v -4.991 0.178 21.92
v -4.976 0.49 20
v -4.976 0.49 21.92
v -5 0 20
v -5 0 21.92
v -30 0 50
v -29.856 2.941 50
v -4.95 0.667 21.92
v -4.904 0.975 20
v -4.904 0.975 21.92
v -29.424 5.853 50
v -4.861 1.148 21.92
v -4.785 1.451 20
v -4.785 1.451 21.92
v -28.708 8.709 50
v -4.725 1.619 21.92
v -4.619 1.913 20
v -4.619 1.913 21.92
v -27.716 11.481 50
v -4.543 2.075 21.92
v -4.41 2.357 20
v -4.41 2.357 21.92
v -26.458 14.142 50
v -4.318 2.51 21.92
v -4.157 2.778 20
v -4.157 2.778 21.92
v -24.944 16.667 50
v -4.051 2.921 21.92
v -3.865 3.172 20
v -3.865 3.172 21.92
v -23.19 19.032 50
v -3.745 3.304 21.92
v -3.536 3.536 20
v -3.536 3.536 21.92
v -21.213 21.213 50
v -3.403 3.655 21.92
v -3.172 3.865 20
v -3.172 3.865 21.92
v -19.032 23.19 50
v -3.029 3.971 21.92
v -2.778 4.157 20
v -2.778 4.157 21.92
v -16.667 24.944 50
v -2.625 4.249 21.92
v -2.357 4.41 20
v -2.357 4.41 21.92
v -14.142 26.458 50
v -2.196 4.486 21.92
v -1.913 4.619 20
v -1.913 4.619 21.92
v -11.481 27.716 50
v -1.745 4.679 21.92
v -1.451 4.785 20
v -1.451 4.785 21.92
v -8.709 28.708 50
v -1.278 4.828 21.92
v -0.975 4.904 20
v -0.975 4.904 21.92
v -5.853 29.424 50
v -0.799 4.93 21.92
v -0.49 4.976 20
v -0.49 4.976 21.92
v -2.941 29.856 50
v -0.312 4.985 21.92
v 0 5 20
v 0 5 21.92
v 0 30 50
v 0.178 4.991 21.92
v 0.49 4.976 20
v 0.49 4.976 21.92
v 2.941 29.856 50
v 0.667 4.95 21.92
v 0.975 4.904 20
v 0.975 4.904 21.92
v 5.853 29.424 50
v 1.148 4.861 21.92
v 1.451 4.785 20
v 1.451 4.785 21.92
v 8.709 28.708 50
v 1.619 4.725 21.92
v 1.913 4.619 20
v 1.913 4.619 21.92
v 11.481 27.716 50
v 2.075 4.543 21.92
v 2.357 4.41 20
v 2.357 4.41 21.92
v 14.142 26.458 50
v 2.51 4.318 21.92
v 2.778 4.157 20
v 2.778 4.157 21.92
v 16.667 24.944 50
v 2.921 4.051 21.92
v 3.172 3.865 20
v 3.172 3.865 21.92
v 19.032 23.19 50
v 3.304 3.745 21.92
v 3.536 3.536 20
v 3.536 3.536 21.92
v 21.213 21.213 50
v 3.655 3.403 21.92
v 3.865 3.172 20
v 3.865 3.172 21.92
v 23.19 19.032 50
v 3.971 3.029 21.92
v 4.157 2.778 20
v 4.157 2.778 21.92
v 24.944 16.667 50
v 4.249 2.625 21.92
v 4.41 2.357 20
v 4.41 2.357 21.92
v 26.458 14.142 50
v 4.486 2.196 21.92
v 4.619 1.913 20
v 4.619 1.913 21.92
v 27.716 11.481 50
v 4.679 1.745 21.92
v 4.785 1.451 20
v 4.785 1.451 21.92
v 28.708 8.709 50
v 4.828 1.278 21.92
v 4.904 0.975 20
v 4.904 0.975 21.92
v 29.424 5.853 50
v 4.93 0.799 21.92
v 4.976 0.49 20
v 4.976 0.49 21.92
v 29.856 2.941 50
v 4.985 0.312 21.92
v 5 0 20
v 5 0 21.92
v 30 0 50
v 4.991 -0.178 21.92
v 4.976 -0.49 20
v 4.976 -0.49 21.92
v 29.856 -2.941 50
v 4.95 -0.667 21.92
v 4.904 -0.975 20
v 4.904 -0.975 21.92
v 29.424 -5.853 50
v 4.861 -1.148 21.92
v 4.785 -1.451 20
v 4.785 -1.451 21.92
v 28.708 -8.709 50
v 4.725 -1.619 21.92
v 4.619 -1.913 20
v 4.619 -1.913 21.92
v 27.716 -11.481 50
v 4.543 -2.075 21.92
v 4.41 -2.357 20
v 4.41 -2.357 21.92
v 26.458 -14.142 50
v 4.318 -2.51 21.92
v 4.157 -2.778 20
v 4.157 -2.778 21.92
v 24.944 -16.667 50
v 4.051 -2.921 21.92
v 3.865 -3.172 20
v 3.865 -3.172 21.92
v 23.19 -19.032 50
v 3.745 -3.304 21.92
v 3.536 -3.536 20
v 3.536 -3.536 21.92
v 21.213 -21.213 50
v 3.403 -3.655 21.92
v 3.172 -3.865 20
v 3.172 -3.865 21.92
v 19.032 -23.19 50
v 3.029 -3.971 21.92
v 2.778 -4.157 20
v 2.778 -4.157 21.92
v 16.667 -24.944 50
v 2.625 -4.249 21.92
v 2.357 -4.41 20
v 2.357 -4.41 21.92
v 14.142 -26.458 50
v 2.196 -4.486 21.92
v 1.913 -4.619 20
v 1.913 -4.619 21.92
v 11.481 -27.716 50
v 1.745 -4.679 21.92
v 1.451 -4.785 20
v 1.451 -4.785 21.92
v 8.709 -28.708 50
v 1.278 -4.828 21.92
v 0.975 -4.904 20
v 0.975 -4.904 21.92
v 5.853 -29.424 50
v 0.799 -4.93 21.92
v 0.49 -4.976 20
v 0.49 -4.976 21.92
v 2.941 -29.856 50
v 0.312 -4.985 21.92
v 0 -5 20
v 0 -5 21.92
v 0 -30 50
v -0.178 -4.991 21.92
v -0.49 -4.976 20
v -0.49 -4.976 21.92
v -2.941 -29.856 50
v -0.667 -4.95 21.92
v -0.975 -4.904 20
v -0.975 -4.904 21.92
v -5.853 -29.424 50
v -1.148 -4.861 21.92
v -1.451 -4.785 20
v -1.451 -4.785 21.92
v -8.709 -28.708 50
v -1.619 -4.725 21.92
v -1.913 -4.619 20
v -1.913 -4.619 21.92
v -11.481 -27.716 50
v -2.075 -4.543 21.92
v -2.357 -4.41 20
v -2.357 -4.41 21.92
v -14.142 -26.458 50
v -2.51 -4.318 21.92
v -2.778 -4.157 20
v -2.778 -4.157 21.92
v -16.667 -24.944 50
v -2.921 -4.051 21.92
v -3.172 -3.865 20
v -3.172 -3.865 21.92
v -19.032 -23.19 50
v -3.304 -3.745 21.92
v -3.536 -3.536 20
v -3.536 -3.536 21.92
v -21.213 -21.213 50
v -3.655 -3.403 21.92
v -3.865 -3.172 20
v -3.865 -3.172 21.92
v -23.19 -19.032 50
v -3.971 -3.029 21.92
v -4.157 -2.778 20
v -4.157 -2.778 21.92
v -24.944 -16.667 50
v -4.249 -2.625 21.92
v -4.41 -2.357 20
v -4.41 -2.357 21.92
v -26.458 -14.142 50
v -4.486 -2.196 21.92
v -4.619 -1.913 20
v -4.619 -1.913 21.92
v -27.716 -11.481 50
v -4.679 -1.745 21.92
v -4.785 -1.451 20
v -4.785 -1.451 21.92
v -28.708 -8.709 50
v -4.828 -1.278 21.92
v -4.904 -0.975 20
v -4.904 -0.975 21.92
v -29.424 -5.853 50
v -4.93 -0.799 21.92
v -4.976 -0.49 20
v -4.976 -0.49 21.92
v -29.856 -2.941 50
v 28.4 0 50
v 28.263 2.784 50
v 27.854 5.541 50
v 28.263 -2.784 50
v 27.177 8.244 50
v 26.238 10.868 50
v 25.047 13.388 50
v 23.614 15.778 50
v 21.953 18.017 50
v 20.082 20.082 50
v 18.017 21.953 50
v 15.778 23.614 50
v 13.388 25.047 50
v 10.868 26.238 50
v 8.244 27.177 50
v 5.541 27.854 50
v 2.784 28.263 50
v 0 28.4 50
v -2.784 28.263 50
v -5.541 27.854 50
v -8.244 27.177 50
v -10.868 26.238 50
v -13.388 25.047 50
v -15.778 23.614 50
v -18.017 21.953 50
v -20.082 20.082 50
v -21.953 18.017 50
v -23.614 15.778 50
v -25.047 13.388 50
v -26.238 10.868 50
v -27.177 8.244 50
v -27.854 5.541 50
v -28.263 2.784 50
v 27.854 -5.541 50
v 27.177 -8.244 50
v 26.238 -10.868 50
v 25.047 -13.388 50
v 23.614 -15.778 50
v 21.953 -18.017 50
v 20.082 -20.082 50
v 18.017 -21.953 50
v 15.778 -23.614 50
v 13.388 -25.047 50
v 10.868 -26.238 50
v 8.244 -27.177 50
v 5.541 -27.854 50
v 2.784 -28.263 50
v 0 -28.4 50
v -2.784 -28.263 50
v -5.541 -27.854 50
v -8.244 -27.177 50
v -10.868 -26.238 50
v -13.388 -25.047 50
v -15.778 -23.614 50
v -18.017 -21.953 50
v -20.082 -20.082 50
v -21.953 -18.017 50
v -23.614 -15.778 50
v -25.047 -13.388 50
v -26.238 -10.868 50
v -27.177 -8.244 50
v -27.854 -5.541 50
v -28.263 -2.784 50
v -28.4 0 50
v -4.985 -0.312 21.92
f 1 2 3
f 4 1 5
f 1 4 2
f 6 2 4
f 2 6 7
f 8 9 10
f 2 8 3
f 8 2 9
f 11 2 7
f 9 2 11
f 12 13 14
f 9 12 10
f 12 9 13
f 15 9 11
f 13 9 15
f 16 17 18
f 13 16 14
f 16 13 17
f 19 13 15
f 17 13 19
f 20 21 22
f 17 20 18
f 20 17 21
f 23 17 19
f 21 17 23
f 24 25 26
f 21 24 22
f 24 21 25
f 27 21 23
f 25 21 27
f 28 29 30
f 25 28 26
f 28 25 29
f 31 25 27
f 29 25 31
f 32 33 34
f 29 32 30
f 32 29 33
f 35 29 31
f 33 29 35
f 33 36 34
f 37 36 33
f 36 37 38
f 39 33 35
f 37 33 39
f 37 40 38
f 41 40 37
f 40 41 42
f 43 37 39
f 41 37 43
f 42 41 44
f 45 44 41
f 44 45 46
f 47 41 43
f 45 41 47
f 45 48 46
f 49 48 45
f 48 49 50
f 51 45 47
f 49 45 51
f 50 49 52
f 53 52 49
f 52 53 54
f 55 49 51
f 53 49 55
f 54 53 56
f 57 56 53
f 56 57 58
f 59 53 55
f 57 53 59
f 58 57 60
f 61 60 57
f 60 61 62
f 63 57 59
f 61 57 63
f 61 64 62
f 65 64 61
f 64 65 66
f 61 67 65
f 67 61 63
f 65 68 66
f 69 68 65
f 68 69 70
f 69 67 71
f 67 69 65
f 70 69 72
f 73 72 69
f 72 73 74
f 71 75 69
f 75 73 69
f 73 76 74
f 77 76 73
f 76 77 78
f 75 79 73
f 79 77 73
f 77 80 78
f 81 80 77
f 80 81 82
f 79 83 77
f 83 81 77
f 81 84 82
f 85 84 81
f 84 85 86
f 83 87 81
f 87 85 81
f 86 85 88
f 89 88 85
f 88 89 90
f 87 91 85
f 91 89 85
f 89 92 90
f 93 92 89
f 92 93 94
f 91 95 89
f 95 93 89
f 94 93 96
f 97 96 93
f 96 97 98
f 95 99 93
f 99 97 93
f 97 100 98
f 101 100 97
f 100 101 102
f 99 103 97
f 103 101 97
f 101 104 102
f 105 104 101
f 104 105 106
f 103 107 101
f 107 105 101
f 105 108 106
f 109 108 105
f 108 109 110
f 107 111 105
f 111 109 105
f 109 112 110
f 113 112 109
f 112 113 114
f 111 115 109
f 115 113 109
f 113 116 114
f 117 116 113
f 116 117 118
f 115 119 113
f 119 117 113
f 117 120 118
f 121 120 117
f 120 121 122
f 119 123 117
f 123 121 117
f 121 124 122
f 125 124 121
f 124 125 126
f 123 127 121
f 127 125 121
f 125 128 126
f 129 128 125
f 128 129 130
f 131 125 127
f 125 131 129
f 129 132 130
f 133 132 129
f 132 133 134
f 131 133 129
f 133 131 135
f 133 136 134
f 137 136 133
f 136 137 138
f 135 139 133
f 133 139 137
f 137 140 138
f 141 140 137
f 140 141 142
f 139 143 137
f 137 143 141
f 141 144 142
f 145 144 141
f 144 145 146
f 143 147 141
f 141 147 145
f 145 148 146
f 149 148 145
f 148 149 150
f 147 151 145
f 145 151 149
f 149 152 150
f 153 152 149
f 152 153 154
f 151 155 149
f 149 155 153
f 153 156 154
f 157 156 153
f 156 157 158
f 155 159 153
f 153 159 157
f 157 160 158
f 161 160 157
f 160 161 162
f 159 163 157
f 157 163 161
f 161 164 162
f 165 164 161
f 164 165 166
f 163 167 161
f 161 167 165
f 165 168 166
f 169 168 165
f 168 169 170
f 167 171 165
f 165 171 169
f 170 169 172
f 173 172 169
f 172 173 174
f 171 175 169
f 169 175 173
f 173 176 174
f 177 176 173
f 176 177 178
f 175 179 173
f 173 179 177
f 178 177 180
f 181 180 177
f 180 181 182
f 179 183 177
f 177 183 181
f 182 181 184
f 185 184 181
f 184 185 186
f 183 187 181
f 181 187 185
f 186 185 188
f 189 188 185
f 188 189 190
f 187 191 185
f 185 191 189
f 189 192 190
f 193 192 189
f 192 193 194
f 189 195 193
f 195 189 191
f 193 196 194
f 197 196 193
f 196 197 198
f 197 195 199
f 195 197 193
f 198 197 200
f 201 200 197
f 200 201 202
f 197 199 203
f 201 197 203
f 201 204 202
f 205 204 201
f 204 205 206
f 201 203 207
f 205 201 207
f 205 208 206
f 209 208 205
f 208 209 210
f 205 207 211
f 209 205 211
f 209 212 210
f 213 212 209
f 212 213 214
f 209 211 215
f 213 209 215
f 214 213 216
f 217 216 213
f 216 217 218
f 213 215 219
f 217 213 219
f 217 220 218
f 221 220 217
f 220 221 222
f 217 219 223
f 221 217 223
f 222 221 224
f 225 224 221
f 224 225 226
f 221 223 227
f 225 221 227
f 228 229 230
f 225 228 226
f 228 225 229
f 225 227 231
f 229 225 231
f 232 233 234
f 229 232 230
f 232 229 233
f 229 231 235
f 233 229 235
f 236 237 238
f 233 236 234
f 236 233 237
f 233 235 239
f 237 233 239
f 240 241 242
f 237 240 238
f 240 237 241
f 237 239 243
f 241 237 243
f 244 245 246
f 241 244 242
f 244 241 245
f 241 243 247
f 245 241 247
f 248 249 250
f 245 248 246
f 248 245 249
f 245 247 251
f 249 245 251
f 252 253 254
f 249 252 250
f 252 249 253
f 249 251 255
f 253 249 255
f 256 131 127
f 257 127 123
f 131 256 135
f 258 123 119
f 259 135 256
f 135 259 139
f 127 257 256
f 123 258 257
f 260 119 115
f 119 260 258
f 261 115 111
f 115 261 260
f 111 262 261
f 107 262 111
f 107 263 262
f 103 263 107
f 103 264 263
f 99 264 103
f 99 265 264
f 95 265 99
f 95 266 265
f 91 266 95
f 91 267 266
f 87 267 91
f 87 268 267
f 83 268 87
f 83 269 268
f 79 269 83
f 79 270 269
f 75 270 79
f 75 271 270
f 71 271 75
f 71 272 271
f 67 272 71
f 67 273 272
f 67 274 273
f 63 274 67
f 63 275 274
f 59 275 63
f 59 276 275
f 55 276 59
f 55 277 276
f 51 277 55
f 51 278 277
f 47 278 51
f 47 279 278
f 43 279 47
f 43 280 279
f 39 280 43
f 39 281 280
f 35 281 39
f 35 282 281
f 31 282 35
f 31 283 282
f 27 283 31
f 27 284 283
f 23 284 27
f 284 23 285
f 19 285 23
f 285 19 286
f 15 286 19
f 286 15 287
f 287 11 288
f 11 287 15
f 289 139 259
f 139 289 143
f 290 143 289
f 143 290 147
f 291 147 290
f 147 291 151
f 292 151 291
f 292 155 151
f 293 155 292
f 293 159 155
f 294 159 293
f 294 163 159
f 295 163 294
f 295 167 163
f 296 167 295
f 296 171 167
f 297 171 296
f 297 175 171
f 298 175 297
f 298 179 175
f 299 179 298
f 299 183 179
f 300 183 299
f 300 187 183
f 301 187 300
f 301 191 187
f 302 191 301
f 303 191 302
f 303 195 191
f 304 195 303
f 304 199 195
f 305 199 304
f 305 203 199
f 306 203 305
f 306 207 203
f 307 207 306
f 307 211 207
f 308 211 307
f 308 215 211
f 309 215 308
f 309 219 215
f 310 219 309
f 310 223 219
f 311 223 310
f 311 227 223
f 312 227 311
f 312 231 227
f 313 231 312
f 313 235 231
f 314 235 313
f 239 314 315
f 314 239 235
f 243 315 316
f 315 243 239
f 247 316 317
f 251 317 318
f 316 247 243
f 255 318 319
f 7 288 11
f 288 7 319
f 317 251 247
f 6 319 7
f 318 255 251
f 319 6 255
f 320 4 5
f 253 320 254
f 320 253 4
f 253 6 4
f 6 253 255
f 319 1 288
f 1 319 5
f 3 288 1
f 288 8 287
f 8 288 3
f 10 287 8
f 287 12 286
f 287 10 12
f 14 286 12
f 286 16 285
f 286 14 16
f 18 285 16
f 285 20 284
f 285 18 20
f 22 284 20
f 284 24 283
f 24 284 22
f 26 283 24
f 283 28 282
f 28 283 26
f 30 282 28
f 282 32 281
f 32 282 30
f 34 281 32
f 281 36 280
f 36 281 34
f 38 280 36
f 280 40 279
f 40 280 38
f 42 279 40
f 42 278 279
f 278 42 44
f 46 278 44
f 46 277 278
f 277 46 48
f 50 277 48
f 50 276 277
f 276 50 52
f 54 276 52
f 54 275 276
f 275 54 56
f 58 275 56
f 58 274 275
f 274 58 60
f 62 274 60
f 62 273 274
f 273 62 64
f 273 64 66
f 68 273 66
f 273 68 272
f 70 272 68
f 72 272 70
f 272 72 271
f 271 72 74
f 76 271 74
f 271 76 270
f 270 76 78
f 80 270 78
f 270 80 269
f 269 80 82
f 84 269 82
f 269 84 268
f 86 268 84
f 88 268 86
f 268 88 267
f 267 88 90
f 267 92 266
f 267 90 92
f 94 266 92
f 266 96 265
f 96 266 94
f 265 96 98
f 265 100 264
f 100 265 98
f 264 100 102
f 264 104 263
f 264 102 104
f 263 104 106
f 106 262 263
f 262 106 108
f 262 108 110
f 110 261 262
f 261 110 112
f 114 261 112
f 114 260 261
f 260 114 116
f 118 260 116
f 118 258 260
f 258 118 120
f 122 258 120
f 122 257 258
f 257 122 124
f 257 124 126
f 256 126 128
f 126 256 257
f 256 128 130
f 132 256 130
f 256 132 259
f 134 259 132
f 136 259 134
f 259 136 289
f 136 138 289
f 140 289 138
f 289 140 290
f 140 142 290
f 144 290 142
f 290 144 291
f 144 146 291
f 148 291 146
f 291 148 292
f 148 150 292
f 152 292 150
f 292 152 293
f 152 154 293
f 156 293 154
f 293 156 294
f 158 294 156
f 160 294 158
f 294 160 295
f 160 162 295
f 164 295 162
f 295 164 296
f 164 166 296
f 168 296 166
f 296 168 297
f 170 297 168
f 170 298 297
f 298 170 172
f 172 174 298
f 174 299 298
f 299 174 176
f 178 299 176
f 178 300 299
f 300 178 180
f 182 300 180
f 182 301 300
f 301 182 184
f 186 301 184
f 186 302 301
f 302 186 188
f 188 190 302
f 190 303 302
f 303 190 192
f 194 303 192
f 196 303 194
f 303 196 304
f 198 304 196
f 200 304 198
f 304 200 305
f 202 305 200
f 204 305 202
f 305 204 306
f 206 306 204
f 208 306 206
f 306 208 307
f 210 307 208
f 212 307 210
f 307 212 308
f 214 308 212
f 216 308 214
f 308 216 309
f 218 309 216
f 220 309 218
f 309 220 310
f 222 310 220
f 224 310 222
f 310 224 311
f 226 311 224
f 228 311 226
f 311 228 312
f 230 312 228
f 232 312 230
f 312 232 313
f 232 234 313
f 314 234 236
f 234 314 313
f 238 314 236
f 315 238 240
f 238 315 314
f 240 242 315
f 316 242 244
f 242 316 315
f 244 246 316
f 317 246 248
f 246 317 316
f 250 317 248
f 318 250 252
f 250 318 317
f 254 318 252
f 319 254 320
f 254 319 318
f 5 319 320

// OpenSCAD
// Lab Funnel - Corrected single solid body using rotate_extrude.
// Printed upright (wide opening at top), resting on XY plane at z=0.

// Dimensions
spout_od    = 10;      // Outer diameter of straight spout
spout_id    = 6.8;     // Inner diameter of straight spout (10 - 2*1.6)
spout_len   = 20;      // Length of straight spout (z=0 to z=20)
funnel_start_od = 10;  // Outer diameter at start of cone (z=20)
funnel_end_od  = 60;   // Outer diameter at rim (z=50)
funnel_height = 30;    // Height of cone section (50 - 20)
wall_thick   = 1.6;    // Wall thickness everywhere

// Derived dimensions
funnel_end_id = funnel_end_od - 2 * wall_thick; // 56.8 mm

$fn = 64;

// Define the outer profile as a list of [radius, z] points.
// The profile starts at z=0, goes up the spout, then widens to the rim.
// Points: [r0, z0], [r1, z1], [r2, z2], [r3, z3]
// We need to close the loop for the polygon, so we repeat the first point at the end.
outer_points = [
    [spout_od / 2, 0],
    [spout_od / 2, spout_len],
    [funnel_end_od / 2, spout_len + funnel_height],
    [spout_od / 2, spout_len + funnel_height], // Close the loop back to start radius at top
    [spout_od / 2, 0]                           // Close the loop back to start point
];

// Define the inner profile similarly.
inner_points = [
    [spout_id / 2, 0],
    [spout_id / 2, spout_len],
    [funnel_end_id / 2, spout_len + funnel_height],
    [spout_id / 2, spout_len + funnel_height], // Close the loop back to start radius at top
    [spout_id / 2, 0]                           // Close the loop back to start point
];

difference() {
    // 1. Outer Shell
    rotate_extrude($fn = 64) 
        polygon(points = outer_points);
    
    // 2. Inner Void
    rotate_extrude($fn = 64) 
        polygon(points = inner_points);
}
